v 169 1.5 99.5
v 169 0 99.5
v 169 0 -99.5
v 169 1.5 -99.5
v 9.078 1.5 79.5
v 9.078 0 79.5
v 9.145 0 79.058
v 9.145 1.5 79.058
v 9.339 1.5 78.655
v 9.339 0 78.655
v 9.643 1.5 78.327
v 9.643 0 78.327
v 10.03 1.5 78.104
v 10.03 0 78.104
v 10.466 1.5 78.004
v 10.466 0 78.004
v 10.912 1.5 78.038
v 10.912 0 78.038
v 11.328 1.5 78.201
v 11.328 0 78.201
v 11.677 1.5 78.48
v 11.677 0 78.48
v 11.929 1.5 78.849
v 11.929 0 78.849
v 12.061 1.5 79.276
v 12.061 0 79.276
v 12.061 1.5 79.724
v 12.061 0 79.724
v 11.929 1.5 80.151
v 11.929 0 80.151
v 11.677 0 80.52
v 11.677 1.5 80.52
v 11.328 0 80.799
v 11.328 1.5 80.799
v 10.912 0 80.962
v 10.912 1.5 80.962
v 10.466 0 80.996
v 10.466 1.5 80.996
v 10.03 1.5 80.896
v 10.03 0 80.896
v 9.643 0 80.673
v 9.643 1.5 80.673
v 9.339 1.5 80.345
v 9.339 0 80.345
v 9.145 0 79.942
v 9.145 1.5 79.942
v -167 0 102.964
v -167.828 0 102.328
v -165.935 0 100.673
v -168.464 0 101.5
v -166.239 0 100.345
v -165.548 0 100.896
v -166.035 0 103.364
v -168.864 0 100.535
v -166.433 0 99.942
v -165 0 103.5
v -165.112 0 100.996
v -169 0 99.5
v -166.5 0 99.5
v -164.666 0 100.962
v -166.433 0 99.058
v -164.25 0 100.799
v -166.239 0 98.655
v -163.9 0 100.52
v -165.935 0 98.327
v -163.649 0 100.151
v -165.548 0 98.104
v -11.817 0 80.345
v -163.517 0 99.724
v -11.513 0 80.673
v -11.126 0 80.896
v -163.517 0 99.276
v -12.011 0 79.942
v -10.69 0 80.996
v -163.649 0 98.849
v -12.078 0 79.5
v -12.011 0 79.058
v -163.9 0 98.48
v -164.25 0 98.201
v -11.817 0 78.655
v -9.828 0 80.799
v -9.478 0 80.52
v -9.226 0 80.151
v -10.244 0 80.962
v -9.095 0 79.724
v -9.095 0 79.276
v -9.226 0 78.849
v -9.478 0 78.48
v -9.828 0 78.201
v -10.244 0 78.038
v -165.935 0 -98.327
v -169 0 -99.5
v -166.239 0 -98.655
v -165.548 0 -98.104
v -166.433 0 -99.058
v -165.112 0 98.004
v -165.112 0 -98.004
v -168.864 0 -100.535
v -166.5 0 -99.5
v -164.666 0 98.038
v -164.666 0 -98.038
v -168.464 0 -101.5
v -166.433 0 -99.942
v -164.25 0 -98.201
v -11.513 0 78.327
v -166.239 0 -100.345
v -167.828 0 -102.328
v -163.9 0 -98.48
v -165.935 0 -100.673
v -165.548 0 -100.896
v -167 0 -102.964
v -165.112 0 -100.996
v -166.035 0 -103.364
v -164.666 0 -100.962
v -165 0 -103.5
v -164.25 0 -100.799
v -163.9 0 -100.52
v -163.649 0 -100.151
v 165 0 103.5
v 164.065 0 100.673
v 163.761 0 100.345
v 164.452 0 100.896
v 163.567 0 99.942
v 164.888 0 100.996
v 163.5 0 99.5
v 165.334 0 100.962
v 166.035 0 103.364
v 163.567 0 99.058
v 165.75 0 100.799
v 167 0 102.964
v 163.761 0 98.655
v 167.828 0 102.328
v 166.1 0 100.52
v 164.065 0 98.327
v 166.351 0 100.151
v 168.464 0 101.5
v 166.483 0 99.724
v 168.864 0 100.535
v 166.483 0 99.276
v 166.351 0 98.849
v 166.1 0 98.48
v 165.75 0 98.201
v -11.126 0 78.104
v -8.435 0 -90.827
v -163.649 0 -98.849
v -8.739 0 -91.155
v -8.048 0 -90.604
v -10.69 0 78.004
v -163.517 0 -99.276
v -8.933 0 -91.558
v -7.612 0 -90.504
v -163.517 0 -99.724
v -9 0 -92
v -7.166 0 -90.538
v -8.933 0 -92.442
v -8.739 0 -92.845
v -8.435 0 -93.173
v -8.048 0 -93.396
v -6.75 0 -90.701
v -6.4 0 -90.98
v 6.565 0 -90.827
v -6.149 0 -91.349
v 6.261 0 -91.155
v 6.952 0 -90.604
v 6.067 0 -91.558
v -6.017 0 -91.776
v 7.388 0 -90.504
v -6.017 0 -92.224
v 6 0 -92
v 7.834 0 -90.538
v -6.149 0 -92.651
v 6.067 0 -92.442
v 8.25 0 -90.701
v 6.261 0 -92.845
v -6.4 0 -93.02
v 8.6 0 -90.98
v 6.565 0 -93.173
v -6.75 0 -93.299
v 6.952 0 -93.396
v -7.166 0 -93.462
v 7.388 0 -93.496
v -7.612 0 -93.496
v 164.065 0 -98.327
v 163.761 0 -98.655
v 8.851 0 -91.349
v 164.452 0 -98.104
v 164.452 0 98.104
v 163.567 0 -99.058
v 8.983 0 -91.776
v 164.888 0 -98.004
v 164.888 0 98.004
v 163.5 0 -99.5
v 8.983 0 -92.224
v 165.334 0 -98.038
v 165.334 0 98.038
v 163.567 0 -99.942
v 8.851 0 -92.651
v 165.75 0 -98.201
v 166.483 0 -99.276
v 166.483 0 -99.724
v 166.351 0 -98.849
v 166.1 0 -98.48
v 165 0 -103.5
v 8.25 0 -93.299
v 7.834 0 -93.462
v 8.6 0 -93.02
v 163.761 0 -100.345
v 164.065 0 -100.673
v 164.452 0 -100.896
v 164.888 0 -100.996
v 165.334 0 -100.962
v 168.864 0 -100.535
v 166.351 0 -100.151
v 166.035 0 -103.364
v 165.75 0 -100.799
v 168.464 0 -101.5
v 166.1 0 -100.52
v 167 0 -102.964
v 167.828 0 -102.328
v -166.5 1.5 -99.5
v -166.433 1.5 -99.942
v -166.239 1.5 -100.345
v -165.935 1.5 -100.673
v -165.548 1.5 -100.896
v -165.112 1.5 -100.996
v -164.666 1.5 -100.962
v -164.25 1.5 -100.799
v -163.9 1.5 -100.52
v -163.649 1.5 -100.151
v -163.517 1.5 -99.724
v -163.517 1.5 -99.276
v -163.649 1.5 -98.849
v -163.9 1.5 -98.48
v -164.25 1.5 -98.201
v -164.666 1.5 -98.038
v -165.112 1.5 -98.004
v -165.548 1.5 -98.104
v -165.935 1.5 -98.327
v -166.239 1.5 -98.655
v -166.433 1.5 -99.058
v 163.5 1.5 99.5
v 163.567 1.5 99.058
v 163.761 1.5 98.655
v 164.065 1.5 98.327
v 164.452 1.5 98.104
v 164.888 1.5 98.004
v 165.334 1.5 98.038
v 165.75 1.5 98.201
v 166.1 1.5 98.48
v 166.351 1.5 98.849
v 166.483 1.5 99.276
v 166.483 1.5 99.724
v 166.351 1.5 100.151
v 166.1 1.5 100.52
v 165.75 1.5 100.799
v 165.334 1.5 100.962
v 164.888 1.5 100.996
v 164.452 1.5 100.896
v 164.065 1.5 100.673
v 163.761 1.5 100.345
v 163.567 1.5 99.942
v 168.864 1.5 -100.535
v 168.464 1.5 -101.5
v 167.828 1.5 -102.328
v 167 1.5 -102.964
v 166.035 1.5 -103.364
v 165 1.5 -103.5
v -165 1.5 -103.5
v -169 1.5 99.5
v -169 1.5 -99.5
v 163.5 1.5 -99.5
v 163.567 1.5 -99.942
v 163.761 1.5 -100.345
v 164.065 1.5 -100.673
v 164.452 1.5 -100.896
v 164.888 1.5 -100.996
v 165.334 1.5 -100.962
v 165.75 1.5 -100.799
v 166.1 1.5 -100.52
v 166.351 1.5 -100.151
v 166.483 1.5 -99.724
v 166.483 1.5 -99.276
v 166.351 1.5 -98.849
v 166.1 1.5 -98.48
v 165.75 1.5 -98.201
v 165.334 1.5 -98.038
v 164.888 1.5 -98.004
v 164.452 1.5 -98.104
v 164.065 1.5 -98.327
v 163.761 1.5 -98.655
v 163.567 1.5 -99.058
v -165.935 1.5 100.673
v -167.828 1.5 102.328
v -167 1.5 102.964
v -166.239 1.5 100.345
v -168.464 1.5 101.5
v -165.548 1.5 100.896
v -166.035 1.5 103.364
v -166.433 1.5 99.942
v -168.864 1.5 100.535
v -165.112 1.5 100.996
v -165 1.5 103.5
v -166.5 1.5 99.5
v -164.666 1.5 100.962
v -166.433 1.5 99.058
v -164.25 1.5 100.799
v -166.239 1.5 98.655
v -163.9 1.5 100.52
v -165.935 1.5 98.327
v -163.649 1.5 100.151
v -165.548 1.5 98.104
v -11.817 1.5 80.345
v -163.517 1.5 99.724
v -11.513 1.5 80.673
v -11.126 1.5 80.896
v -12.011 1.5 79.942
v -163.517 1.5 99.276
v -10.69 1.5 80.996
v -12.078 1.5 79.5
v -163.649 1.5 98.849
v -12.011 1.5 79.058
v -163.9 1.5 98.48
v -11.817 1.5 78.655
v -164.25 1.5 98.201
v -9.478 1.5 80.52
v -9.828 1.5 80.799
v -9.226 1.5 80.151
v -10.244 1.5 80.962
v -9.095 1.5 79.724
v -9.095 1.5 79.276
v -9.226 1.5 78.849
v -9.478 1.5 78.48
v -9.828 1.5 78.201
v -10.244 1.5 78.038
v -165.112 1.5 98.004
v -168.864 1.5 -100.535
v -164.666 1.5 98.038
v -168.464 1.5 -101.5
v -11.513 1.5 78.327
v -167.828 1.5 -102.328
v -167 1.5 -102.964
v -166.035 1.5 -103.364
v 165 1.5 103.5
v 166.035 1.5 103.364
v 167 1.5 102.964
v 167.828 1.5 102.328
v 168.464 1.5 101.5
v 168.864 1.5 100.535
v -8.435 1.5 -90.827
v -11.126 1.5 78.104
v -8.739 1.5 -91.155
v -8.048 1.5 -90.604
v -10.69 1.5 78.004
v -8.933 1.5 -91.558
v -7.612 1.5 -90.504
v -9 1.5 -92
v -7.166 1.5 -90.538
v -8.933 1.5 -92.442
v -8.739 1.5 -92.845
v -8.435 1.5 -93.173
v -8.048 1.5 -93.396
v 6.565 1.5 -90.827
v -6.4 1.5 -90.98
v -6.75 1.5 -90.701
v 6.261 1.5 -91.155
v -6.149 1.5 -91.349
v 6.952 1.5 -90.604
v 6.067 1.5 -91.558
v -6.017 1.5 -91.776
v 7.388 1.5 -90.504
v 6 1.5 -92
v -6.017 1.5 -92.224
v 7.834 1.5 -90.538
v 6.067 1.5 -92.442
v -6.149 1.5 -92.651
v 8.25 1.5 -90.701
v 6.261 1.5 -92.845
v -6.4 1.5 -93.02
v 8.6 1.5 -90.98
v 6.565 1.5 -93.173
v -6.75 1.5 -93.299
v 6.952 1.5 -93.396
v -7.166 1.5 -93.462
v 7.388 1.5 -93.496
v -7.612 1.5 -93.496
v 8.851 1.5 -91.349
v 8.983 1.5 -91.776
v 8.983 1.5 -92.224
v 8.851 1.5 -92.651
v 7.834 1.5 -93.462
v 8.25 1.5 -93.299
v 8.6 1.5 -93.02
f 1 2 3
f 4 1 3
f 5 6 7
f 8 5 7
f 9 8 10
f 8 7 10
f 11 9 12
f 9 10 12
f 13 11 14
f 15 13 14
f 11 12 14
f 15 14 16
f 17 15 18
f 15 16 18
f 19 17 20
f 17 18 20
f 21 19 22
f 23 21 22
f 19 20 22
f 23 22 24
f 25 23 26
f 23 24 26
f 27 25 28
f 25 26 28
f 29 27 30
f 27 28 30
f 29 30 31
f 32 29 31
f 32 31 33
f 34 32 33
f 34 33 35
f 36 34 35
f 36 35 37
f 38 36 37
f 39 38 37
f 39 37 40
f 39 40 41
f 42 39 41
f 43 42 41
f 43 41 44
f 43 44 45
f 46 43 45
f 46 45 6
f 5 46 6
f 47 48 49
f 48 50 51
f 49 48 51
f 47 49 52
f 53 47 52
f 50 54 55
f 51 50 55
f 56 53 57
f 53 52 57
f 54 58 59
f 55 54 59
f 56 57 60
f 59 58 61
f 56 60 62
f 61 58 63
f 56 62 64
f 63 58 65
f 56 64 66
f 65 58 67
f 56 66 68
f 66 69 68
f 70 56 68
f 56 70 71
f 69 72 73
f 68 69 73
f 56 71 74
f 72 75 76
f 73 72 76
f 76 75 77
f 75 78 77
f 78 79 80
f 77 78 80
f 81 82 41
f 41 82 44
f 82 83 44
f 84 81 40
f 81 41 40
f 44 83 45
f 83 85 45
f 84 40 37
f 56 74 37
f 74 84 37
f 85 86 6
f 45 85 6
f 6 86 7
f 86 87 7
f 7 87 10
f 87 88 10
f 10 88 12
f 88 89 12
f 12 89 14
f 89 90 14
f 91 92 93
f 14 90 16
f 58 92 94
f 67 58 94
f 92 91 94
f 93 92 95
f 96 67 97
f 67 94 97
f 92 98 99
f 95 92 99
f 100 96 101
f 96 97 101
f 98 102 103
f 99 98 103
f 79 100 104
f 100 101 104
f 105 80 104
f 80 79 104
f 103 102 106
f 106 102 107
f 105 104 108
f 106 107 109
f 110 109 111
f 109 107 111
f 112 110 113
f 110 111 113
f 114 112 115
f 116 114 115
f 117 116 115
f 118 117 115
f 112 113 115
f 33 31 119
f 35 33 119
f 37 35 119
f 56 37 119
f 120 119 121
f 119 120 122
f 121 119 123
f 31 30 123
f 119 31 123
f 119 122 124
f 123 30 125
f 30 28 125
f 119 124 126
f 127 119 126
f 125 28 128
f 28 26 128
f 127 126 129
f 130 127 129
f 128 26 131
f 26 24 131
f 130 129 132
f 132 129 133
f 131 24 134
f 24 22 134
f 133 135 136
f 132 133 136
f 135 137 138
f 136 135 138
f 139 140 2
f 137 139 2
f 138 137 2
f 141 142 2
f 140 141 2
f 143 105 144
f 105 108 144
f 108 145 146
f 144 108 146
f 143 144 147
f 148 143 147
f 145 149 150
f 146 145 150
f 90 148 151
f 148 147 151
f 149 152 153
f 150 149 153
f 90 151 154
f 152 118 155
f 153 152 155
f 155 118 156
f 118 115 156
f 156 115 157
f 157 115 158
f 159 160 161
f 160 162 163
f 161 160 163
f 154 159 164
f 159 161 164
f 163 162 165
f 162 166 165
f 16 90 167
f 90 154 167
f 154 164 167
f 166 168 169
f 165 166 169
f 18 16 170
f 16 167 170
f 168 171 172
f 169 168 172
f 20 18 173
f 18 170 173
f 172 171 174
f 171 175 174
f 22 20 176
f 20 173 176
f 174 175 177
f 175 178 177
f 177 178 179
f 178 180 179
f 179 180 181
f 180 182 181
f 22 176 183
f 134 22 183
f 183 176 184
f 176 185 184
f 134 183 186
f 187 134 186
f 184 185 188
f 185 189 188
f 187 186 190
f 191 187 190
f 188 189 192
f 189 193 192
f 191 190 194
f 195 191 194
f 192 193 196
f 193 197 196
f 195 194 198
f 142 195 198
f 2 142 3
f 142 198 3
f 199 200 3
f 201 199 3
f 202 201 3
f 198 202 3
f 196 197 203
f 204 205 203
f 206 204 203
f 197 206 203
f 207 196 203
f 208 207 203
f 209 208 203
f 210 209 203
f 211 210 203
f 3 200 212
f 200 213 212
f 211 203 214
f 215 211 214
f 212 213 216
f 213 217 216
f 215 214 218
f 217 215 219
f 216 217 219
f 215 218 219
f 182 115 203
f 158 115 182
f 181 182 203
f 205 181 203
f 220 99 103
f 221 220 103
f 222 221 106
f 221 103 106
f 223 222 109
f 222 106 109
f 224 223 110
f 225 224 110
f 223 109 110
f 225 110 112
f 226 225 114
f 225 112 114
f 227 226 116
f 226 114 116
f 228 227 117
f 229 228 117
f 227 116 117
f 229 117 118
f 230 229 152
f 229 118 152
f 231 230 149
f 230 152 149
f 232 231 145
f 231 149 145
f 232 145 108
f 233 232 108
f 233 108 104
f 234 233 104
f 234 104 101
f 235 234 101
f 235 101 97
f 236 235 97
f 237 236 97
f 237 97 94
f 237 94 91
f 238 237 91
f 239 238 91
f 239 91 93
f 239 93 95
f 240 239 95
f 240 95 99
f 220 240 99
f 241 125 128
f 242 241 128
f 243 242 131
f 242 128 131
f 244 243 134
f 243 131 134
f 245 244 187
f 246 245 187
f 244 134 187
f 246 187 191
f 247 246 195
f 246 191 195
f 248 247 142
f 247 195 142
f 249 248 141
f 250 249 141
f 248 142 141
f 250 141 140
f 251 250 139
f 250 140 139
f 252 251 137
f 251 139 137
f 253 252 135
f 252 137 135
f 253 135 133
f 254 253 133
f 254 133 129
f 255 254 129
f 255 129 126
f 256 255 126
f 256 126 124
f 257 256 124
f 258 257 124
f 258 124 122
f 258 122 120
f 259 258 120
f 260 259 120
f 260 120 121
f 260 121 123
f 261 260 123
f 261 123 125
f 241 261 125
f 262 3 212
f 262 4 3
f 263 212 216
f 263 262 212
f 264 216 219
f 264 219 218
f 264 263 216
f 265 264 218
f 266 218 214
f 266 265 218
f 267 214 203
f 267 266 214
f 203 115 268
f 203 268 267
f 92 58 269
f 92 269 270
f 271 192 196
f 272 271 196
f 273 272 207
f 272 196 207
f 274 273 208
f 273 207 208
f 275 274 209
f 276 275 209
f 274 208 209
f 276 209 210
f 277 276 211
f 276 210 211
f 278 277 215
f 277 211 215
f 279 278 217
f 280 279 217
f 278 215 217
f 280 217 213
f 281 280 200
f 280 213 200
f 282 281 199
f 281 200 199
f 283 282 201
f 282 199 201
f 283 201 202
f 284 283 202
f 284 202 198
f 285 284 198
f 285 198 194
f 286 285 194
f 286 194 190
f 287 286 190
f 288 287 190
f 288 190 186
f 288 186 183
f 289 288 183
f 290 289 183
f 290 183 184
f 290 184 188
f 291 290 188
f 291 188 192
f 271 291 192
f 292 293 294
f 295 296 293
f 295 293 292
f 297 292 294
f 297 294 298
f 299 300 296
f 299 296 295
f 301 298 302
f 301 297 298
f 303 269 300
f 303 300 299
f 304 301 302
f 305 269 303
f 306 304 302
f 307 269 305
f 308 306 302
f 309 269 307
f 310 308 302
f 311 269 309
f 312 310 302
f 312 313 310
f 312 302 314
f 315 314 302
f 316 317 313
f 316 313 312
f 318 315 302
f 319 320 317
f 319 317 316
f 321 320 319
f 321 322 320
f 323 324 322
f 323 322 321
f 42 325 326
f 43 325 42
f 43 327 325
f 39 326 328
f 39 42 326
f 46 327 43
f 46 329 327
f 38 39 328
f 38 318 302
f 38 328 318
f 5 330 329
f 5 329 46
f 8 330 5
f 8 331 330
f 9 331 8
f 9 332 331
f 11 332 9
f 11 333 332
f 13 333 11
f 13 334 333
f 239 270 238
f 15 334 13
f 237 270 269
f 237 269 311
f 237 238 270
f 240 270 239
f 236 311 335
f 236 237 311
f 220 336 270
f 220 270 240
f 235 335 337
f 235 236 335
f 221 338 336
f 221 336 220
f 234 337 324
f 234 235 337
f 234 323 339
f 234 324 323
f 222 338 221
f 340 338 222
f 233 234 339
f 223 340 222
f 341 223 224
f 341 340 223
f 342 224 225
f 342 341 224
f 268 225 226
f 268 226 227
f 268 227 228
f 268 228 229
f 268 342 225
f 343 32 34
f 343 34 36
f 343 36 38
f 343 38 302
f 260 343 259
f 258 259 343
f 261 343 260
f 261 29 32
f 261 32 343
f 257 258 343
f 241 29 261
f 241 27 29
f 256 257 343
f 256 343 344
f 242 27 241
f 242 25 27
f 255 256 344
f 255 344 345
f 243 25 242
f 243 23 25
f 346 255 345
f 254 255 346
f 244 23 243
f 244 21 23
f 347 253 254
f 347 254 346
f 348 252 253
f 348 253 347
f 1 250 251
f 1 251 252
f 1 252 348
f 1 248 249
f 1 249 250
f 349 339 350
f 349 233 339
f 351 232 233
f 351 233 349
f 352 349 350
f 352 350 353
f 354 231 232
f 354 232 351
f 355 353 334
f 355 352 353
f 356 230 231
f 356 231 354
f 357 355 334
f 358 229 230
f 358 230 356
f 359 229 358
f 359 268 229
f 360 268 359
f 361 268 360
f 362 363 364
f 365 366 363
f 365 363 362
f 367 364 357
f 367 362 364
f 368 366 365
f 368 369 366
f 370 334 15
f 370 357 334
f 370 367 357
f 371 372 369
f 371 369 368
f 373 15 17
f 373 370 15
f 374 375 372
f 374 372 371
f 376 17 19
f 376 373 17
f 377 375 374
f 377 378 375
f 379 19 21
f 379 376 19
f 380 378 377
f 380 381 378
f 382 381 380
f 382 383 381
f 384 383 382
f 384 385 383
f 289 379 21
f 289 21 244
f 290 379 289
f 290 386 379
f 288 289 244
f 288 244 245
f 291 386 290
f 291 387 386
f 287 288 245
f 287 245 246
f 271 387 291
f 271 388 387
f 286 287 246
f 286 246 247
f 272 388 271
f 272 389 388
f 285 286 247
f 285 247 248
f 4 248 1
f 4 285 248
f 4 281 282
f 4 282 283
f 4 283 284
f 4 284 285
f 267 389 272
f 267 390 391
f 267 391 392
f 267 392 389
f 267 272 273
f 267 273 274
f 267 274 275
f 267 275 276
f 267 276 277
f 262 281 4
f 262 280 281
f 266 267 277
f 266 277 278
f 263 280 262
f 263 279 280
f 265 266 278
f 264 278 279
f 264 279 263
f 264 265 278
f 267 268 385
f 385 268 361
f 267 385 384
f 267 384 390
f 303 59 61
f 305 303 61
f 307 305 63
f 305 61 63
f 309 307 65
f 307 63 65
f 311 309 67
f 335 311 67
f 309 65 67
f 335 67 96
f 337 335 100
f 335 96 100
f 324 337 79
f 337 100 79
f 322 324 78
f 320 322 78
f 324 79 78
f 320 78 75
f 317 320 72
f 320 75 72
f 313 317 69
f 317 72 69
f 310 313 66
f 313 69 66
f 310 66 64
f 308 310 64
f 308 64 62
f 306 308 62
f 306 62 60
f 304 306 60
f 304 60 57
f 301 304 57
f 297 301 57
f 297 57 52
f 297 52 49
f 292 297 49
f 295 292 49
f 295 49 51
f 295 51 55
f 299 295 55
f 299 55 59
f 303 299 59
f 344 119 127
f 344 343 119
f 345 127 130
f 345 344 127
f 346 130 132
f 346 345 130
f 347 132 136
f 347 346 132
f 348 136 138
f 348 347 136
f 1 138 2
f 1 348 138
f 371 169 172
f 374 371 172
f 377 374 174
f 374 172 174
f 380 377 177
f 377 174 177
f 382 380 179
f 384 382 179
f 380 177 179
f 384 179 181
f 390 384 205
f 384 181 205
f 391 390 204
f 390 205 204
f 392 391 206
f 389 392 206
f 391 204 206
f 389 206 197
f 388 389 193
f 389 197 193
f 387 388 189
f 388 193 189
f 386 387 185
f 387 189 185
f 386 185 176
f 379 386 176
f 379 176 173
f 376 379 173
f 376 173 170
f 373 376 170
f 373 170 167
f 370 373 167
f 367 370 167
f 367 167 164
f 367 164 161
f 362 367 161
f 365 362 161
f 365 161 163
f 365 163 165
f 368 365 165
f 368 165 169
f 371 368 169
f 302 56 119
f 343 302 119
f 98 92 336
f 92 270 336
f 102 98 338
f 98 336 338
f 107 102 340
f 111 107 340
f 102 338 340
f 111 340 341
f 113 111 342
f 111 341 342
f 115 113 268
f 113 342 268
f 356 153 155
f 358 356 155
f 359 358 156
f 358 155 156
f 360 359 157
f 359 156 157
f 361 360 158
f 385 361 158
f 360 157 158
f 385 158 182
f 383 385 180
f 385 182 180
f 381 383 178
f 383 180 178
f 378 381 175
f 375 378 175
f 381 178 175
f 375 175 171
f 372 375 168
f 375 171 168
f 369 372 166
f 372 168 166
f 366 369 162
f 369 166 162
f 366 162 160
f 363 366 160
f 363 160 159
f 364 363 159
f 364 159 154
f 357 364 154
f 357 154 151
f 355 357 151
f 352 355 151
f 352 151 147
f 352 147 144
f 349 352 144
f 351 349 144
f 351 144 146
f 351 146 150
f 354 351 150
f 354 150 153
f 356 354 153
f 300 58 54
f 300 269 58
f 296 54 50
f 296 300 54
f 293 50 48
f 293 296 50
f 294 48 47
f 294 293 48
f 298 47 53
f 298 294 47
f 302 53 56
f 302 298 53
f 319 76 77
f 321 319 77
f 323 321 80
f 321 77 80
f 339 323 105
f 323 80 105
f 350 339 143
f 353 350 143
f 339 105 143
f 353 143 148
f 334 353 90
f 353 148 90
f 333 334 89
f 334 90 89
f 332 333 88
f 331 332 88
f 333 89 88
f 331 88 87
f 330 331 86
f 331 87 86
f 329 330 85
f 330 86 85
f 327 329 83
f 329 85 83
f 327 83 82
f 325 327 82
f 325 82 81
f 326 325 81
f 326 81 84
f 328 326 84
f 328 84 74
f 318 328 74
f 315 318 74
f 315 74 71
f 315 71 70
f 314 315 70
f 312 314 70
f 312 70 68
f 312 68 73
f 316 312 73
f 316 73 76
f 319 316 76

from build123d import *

# Parameters (mm, degrees)
SKETCH1_W                 = 338
SKETCH1_H                 = 207
BOSS_EXTRUDE1_DEPTH       = 1.5
FILLET1_R                 = 4
F_3_0MM_DOWEL_HOLE1_D     = 3
F_3_0MM_DOWEL_HOLE1_DEPTH = 17.29
F_3_0MM_DOWEL_HOLE1_TIP   = 0.901290929


with BuildPart() as part:
    # Sketch1 → Boss-Extrude1 (new body)
    with BuildSketch(Plane(origin=(0, 0, 0), x_dir=(1, 0, 0), z_dir=(0, 1, 0))):
        Rectangle(SKETCH1_W, SKETCH1_H)
    extrude(amount=BOSS_EXTRUDE1_DEPTH)

    # Fillet1
    fillet1_edges = [part.edges().sort_by_distance(p)[0] for p in [
        (-169, 0.75, -103.5),
        (169, 0.75, -103.5),
        (169, 0.75, 103.5),
        (-169, 0.75, 103.5),
    ]]
    fillet(fillet1_edges, radius=FILLET1_R)

    # Ø3.0mm Dowel Hole1
    with Locations(Plane(origin=(0, 1.5, 0), x_dir=(1, 0, 0), z_dir=(0, 1, 0))):
        with Locations((-165, -99.5), (-165, 99.5), (165, 99.5), (165, -99.5), (-10.577889447, -79.5), (10.577889447, -79.5), (-7.5, 92), (7.5, 92)):
            Hole(F_3_0MM_DOWEL_HOLE1_D / 2, depth=F_3_0MM_DOWEL_HOLE1_DEPTH)
            with Locations((0, 0, -(F_3_0MM_DOWEL_HOLE1_DEPTH + F_3_0MM_DOWEL_HOLE1_TIP / 2))):  # 118° drill point
                Cone(0, F_3_0MM_DOWEL_HOLE1_D / 2, F_3_0MM_DOWEL_HOLE1_TIP, mode=Mode.SUBTRACT)


solid = part.part
